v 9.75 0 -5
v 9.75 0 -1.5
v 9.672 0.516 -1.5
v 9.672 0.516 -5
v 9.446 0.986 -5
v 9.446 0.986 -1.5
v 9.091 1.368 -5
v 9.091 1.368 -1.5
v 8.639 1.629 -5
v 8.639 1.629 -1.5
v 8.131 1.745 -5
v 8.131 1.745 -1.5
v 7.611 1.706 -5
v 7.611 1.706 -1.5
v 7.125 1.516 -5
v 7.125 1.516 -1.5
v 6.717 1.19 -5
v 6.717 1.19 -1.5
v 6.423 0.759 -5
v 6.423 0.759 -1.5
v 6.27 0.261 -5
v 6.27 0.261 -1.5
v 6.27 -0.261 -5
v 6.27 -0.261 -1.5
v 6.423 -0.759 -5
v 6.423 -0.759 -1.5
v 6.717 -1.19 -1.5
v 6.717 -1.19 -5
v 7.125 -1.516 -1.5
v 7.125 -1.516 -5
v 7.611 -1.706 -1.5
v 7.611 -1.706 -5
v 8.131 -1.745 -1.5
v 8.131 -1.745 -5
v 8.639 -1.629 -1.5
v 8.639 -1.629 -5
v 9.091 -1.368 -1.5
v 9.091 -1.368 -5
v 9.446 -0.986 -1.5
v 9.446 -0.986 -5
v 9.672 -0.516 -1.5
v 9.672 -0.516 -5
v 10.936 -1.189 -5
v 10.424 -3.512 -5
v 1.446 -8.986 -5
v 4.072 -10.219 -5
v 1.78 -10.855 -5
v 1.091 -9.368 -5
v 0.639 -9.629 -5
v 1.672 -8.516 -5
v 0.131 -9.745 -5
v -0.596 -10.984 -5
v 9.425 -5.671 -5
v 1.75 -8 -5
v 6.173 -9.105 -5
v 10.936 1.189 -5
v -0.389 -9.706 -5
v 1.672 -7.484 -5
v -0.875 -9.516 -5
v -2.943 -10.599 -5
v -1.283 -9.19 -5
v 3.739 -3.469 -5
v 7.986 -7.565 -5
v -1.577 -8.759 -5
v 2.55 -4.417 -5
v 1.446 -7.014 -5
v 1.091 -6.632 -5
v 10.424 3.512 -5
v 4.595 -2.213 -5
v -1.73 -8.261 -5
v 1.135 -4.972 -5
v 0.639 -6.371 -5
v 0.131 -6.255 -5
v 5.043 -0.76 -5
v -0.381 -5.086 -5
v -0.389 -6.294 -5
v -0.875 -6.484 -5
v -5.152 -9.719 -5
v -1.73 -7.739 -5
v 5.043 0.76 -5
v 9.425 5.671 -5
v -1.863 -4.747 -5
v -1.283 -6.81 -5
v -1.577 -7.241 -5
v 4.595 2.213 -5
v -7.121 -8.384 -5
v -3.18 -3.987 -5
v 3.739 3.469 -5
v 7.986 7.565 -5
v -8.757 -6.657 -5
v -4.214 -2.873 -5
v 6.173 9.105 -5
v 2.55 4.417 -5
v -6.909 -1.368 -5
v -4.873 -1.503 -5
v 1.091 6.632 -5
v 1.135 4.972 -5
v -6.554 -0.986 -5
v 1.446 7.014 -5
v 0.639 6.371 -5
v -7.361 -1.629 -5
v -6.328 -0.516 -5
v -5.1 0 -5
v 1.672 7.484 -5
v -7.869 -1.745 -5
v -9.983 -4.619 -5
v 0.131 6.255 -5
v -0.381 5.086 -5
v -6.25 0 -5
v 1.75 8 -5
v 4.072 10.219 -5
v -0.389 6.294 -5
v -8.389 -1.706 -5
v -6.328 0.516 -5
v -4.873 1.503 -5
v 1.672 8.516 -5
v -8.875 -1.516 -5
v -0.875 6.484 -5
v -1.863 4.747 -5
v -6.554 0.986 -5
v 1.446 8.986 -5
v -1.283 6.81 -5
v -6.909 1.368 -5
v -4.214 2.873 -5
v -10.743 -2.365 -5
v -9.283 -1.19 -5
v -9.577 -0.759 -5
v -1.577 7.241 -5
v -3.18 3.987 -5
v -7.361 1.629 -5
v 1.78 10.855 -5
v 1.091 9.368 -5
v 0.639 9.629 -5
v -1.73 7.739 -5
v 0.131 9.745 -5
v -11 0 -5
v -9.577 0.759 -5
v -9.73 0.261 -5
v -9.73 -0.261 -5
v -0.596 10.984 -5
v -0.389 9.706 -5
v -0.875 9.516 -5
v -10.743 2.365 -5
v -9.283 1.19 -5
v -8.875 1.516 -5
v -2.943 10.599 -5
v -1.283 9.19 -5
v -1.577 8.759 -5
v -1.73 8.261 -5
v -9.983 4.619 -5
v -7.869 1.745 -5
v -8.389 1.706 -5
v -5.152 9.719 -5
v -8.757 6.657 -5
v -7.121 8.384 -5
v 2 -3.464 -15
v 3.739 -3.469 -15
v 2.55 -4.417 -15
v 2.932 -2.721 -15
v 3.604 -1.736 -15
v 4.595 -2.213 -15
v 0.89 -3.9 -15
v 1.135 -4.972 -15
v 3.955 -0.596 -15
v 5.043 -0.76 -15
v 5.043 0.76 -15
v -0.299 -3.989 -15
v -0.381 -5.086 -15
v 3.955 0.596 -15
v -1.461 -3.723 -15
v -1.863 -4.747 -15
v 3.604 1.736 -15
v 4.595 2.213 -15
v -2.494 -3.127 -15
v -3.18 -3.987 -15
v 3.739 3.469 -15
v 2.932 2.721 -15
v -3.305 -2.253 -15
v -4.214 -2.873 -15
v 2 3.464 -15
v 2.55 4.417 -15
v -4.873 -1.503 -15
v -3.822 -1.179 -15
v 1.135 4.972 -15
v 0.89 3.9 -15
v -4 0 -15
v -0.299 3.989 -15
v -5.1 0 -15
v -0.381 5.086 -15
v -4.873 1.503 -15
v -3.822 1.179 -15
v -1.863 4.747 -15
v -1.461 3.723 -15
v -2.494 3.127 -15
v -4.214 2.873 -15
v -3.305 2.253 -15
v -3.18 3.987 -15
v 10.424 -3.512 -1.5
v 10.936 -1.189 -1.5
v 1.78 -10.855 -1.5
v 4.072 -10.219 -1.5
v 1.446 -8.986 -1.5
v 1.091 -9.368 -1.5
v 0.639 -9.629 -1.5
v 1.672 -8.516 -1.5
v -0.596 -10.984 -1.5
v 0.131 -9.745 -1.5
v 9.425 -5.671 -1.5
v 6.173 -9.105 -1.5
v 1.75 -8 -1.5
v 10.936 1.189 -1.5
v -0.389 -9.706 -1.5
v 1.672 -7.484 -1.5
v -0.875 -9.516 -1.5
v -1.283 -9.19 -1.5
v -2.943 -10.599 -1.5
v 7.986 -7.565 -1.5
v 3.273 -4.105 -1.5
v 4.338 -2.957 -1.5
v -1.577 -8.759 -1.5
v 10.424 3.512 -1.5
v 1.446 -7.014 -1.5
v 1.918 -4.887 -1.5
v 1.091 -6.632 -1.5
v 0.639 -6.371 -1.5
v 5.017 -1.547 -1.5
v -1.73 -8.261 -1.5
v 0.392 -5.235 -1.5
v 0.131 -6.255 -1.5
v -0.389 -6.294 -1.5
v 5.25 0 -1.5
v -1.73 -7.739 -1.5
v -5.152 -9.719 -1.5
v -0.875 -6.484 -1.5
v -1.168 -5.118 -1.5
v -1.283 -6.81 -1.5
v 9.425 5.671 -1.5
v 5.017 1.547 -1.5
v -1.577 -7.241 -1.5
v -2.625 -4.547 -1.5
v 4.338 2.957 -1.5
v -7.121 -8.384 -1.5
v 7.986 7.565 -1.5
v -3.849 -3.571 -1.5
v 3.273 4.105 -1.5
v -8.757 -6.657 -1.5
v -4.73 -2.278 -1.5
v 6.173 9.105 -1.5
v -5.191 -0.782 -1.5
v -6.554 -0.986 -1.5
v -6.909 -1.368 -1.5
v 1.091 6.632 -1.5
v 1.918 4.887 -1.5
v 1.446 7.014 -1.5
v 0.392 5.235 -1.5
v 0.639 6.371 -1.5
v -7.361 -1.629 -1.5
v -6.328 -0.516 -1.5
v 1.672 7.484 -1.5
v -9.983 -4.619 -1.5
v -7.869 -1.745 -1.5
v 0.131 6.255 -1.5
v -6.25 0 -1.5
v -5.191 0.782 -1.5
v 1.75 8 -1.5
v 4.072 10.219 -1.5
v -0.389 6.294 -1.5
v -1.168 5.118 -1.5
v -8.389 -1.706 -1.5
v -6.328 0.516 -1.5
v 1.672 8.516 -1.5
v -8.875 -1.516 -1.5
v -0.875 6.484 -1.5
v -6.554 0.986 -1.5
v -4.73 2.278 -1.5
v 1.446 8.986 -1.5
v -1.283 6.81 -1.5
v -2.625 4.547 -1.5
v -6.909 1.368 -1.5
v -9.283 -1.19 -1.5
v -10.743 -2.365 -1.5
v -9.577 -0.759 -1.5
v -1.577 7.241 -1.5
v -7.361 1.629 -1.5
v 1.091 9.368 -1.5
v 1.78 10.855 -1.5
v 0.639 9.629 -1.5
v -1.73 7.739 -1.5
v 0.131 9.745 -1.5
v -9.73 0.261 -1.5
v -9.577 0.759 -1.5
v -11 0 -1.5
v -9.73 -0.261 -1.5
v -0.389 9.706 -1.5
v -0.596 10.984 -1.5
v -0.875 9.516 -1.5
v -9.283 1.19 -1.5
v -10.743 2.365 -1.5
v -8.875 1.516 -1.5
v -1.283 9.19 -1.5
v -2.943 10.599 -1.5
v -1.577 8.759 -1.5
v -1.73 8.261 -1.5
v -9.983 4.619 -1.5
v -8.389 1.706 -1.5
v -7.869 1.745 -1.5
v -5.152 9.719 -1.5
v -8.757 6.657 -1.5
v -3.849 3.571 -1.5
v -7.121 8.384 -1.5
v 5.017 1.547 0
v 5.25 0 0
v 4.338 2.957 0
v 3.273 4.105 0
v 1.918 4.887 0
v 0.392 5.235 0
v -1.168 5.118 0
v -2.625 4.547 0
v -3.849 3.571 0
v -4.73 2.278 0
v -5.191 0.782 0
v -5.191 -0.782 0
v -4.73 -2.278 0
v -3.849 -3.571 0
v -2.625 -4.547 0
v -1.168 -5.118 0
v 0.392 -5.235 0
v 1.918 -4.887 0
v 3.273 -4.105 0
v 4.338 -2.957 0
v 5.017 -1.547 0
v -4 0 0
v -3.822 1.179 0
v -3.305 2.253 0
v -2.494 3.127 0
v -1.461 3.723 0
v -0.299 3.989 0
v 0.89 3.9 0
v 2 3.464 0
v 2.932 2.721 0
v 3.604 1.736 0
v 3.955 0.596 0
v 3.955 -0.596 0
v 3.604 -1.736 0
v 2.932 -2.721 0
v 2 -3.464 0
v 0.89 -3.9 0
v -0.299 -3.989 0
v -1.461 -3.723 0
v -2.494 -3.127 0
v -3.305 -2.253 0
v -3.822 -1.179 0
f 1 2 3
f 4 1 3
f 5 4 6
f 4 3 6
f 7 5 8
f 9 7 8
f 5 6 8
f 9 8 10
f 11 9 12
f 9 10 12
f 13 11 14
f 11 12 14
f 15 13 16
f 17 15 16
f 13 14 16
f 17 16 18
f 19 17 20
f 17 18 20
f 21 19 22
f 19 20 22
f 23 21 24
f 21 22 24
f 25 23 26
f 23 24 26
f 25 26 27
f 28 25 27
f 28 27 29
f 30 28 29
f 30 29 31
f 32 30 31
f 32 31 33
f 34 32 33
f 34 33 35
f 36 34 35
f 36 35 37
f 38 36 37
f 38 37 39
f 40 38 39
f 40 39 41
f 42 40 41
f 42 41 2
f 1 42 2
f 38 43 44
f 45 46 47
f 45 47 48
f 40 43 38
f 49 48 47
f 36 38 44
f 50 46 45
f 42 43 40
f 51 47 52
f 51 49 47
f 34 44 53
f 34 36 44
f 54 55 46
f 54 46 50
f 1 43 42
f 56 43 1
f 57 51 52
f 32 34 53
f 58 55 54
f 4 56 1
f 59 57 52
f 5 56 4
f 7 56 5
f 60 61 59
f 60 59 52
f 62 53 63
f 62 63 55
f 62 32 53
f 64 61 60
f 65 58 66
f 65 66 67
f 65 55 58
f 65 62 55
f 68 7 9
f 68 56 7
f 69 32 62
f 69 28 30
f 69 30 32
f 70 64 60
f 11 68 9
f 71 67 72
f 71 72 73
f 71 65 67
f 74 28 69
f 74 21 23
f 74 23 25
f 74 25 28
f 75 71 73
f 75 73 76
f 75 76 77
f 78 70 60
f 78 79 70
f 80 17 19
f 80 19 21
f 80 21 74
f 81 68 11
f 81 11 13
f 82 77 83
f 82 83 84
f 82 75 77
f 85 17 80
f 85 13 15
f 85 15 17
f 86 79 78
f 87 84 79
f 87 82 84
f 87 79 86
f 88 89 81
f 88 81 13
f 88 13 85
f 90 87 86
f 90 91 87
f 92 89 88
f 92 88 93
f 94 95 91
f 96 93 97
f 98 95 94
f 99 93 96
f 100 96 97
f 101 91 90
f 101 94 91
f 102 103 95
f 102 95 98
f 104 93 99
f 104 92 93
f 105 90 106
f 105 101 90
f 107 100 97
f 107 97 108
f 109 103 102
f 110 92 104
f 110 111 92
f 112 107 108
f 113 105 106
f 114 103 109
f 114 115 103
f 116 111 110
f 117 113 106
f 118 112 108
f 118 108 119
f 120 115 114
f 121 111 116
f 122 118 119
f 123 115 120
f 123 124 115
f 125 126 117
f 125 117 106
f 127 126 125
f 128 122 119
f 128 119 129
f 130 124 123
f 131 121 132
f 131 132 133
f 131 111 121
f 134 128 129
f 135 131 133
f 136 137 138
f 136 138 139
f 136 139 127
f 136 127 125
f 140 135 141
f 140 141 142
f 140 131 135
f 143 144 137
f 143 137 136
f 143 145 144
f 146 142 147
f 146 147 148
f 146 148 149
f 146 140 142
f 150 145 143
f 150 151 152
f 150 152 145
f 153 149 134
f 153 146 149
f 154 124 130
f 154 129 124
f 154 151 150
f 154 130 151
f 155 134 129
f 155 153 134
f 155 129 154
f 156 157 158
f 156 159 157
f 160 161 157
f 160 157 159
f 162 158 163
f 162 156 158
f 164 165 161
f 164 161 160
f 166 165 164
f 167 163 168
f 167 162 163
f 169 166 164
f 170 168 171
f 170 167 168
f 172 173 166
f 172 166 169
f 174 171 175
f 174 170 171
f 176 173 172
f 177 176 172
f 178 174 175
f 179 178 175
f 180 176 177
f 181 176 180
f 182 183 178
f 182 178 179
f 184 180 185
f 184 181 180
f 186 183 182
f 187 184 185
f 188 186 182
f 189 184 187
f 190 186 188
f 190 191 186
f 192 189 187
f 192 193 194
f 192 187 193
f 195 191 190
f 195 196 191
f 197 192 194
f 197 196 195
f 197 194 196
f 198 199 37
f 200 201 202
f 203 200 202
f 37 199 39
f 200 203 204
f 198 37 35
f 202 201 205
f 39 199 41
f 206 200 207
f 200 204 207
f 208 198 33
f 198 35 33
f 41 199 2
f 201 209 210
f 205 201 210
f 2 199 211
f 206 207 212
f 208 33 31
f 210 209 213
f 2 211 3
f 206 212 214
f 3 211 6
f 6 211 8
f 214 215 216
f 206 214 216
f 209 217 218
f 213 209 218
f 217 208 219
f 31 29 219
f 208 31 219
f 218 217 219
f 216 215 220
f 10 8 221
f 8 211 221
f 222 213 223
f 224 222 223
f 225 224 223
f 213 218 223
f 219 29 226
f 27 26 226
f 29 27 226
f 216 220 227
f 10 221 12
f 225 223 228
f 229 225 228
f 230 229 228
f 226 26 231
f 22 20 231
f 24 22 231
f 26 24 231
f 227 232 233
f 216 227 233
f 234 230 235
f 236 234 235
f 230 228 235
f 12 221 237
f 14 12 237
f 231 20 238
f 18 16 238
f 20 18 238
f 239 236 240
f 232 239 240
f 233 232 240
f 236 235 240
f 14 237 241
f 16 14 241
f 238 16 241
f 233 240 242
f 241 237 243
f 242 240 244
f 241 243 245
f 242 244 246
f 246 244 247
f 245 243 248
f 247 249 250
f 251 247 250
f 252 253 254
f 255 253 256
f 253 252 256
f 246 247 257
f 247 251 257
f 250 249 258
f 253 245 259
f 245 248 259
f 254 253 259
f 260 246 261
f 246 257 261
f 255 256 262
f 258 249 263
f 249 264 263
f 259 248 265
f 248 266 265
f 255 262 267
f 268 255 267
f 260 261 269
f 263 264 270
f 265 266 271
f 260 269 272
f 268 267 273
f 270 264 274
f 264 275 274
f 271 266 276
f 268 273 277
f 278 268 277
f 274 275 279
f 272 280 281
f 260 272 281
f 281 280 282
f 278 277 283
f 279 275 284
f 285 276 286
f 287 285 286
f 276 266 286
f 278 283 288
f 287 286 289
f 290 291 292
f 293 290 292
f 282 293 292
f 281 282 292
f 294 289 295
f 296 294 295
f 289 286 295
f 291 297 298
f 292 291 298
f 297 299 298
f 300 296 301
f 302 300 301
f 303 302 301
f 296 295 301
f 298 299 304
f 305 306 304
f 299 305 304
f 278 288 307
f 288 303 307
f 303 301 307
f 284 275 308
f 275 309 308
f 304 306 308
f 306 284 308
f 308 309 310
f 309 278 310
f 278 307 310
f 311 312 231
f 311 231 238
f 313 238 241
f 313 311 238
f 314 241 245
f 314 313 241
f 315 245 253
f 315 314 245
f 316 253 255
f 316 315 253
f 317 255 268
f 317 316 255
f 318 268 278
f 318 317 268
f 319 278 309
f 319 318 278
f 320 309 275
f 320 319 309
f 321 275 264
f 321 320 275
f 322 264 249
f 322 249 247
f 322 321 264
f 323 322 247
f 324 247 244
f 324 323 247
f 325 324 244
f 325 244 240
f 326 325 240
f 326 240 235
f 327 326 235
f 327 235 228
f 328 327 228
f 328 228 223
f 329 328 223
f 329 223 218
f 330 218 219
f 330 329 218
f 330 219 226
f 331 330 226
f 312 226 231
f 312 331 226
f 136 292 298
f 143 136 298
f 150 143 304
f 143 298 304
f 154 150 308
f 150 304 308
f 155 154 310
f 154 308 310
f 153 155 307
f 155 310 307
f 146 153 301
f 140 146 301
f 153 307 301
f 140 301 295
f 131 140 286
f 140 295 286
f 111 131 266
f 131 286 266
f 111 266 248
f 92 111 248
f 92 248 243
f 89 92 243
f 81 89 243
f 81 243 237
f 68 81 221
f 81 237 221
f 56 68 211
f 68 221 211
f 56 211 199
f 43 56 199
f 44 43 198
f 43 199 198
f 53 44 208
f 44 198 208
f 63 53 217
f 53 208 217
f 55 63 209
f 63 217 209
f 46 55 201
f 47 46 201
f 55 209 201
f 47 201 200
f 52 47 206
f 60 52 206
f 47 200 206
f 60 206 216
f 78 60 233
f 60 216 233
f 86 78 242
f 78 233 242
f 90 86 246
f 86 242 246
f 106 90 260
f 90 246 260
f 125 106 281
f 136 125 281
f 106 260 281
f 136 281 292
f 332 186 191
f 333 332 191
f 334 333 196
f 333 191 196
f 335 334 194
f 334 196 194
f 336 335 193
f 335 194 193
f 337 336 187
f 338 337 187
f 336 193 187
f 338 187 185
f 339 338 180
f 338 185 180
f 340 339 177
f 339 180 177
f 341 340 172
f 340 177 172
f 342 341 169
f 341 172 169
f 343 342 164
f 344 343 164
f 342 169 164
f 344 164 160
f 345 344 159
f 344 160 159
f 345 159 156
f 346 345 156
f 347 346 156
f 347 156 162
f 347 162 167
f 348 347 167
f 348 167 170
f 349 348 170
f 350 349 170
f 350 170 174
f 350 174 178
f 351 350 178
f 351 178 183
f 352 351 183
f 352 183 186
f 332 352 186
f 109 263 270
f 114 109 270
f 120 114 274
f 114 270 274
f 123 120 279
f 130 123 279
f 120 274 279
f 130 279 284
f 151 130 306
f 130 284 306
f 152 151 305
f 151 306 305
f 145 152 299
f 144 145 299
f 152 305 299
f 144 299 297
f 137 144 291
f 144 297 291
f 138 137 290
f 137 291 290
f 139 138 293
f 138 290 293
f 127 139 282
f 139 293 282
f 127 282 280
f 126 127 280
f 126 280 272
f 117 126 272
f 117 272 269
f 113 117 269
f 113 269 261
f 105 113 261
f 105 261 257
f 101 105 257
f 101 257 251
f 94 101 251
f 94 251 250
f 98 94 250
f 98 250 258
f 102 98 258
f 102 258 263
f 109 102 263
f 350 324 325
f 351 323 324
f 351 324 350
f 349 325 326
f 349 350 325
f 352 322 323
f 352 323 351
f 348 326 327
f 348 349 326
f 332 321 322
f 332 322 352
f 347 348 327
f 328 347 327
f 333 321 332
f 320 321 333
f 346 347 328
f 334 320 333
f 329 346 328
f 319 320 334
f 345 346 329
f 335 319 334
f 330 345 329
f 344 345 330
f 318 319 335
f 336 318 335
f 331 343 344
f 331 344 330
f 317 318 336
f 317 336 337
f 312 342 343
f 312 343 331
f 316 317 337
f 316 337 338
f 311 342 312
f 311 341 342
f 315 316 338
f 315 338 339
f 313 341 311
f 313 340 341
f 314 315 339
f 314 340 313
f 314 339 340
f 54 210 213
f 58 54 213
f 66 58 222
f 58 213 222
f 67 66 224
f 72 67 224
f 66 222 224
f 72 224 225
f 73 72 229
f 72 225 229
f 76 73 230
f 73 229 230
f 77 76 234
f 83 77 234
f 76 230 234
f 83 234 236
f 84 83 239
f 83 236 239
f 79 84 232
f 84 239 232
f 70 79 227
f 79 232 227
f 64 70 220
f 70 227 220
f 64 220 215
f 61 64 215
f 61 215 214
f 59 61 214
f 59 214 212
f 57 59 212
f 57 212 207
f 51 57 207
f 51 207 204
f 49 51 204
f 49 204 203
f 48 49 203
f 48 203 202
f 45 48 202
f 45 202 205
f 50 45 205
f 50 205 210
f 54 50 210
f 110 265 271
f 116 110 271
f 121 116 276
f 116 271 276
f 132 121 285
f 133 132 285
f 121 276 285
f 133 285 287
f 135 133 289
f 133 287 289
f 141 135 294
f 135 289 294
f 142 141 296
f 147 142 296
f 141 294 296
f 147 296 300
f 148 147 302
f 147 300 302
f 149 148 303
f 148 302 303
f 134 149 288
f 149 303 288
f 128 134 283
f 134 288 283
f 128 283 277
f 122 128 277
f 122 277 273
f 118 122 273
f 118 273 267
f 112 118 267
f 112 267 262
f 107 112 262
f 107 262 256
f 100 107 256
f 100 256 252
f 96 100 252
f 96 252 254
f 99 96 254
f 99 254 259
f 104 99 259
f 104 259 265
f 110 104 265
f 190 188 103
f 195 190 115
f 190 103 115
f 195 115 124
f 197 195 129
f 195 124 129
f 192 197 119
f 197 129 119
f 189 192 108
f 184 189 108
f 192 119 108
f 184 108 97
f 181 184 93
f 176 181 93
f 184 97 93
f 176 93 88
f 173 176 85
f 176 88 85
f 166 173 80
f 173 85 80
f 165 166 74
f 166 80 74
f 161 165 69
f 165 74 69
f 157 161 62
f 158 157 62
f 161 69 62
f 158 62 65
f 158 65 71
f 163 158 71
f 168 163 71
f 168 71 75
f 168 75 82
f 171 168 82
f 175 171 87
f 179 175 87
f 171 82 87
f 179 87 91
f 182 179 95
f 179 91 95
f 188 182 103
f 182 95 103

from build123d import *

# Parameters (mm, degrees)
SKETCH1_R           = 5.25
BOSS_EXTRUDE1_DEPTH = 1.5
SKETCH2_R           = 11
BOSS_EXTRUDE2_DEPTH = 3.5
SKETCH3_R           = 5.1
BOSS_EXTRUDE3_DEPTH = 10
SKETCH4_R           = 4
CUT_EXTRUDE1_DEPTH  = 22.610182785
SKETCH5_R           = 1.75
CUT_EXTRUDE2_DEPTH  = 10


with BuildPart() as part:
    # Sketch1 → Boss-Extrude1 (new body)
    with BuildSketch(Plane.XY):
        Circle(SKETCH1_R)
    extrude(amount=-BOSS_EXTRUDE1_DEPTH)

    # Sketch2 → Boss-Extrude2 (add)
    with BuildSketch(Plane(origin=(0, 0, -1.5), x_dir=(-1, 0, 0), z_dir=(0, 0, -1))):
        Circle(SKETCH2_R)
    extrude(amount=BOSS_EXTRUDE2_DEPTH)

    # Sketch3 → Boss-Extrude3 (add)
    with BuildSketch(Plane(origin=(0, 0, -5), x_dir=(-1, 0, 0), z_dir=(0, 0, -1))):
        Circle(SKETCH3_R)
    extrude(amount=BOSS_EXTRUDE3_DEPTH)

    # Sketch4 → Cut-Extrude1 (cut, through all)
    with BuildSketch(Plane(origin=(0, 0, -15), x_dir=(-1, 0, 0), z_dir=(0, 0, -1))):
        Circle(SKETCH4_R)
    extrude(amount=-CUT_EXTRUDE1_DEPTH, mode=Mode.SUBTRACT)

    # Sketch5 → Cut-Extrude2 (cut)
    with BuildSketch(Plane.XY.offset(-1.5)):
        with Locations((-8, 0)):
            Circle(SKETCH5_R)
        with Locations((0, 8)):
            Circle(SKETCH5_R)
        with Locations((8, 0)):
            Circle(SKETCH5_R)
        with Locations((0, -8)):
            Circle(SKETCH5_R)
    extrude(amount=-CUT_EXTRUDE2_DEPTH, mode=Mode.SUBTRACT)


solid = part.part
